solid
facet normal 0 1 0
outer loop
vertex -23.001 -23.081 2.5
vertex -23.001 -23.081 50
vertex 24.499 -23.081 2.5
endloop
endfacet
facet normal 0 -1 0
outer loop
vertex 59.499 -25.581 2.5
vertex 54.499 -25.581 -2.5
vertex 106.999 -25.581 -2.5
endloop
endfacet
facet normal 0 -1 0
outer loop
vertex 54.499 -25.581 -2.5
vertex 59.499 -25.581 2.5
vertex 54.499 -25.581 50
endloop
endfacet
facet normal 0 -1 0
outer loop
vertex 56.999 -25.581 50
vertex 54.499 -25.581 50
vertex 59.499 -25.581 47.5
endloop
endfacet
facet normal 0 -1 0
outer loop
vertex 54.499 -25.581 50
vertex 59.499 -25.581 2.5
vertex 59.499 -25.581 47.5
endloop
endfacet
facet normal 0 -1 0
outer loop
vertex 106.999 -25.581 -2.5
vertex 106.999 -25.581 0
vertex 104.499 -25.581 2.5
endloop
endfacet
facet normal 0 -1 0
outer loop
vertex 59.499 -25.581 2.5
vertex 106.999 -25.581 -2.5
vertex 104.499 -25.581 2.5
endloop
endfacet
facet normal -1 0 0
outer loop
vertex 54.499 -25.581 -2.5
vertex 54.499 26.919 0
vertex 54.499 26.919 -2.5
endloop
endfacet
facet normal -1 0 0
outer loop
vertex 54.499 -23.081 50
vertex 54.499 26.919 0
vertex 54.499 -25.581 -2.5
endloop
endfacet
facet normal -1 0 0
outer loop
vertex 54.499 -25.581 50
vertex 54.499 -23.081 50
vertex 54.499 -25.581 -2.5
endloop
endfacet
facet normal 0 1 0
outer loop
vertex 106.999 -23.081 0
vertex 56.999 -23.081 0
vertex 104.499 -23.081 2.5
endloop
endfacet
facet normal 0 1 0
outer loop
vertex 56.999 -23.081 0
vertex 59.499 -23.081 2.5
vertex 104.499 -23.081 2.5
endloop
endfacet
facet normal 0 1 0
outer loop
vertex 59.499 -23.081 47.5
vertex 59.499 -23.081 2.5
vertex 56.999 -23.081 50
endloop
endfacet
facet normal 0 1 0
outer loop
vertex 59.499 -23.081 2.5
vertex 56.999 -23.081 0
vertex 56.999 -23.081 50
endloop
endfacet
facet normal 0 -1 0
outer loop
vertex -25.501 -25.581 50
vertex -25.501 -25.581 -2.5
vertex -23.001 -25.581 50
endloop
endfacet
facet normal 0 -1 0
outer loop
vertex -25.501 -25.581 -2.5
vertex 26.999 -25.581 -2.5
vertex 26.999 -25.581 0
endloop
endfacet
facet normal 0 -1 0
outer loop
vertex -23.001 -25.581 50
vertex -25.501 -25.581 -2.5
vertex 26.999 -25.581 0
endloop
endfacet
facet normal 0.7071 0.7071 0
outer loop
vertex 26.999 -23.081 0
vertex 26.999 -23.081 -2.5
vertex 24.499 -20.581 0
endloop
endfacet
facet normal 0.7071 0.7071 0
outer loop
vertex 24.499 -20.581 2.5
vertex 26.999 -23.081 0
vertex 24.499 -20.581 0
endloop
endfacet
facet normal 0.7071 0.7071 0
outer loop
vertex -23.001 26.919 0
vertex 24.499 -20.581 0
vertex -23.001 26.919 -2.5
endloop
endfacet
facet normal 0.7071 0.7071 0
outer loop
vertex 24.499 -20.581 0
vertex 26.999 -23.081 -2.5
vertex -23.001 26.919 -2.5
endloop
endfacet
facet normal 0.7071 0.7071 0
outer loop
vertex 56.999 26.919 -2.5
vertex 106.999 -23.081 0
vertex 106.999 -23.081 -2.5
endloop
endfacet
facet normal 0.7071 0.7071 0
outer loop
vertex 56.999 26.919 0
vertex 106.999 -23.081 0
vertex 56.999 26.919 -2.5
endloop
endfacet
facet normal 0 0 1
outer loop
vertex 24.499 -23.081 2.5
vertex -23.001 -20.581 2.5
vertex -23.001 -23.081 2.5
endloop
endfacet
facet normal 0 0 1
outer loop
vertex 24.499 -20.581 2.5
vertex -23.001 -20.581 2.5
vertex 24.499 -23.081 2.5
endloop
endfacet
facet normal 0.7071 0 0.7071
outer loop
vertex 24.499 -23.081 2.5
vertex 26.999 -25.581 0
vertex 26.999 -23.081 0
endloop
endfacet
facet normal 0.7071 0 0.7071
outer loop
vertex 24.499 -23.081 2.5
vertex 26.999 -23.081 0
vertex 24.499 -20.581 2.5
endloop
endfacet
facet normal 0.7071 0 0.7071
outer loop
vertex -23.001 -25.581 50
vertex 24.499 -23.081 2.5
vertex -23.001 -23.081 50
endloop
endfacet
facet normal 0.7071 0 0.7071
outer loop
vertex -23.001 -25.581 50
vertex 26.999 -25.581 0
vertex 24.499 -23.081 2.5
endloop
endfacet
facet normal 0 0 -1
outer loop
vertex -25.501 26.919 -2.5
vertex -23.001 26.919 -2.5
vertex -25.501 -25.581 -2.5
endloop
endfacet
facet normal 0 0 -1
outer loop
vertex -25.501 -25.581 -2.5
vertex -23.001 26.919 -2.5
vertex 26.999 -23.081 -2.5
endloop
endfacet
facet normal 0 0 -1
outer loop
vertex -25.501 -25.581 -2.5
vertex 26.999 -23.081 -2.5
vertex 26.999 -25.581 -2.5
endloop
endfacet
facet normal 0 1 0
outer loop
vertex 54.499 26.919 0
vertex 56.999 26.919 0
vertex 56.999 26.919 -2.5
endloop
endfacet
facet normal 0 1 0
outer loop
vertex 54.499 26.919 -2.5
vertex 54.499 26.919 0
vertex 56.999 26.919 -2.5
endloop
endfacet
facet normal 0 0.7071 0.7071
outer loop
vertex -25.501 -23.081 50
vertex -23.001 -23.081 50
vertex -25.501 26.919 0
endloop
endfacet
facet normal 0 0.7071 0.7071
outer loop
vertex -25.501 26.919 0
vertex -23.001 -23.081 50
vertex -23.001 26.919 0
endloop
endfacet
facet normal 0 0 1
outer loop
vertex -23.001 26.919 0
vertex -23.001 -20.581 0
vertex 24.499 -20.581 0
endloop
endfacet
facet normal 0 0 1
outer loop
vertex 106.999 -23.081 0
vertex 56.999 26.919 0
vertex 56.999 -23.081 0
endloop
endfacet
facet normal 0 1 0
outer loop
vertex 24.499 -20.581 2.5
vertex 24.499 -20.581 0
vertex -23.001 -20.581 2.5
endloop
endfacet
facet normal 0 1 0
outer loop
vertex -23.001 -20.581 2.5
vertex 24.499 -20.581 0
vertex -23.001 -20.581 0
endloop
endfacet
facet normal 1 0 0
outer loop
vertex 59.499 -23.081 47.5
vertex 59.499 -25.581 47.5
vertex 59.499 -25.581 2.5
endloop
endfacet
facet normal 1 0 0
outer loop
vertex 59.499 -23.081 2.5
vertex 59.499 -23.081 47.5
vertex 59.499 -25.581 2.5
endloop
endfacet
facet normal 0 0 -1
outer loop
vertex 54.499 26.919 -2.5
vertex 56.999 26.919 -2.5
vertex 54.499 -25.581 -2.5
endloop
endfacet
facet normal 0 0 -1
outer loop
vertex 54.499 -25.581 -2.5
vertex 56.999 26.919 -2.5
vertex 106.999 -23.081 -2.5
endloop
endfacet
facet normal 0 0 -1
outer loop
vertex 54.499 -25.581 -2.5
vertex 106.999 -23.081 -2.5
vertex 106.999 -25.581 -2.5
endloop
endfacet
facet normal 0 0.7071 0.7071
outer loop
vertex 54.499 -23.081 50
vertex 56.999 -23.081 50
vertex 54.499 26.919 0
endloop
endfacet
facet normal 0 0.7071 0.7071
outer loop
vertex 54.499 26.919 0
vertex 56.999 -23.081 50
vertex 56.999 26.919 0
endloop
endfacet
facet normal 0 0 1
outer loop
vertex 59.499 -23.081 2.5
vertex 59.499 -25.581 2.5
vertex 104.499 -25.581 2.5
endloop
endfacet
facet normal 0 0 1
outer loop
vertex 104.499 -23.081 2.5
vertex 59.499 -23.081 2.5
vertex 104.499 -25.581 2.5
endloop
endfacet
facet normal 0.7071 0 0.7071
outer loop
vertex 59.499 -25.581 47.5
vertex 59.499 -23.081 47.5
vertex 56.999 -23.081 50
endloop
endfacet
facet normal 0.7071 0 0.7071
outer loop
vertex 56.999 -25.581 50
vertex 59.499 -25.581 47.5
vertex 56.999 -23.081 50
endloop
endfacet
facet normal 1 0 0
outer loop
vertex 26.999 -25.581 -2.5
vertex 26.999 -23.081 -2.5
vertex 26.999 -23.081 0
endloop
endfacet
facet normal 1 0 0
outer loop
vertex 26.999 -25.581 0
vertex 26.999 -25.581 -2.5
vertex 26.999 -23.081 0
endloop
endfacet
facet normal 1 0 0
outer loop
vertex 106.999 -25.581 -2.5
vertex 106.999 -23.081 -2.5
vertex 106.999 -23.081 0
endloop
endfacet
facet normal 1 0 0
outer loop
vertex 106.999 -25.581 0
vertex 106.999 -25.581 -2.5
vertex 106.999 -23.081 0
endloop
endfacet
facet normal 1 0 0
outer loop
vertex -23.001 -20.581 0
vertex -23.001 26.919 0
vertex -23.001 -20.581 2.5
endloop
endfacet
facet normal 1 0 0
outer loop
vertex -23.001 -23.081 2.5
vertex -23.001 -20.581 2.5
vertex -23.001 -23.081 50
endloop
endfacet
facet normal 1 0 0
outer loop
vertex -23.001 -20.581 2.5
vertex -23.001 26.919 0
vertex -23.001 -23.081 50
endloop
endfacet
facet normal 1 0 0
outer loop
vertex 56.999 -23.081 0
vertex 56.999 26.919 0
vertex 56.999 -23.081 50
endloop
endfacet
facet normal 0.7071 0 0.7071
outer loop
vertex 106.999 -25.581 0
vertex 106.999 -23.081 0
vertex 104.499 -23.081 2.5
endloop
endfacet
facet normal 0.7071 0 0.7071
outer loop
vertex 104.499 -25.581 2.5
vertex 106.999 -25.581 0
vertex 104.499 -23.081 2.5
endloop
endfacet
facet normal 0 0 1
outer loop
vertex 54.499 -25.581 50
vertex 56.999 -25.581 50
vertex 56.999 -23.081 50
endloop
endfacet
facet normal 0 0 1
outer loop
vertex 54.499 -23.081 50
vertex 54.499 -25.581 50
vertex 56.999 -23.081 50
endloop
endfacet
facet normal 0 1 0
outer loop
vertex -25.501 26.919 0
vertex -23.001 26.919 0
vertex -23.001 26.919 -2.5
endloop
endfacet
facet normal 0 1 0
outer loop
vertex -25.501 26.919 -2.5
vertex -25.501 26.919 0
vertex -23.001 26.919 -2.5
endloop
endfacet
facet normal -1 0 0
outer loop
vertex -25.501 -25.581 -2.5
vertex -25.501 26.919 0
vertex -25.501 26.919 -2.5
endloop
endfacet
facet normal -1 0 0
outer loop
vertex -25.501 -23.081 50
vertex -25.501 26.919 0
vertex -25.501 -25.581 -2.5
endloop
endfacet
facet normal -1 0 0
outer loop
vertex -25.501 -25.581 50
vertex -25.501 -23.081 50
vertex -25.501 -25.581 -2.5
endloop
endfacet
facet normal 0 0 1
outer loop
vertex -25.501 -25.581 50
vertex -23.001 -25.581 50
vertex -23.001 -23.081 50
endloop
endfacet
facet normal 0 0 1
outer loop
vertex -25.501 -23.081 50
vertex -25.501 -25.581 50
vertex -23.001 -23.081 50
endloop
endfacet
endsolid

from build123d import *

# Parameters (mm, degrees)
F1_DEPTH  = 2.5
F2_W      = 50
F2_H      = 2.5
F3_DEPTH  = 2.5
F5_DEPTH  = 2.5
F8_DEPTH  = 2.5
F9_DEPTH  = 2.5
F10_DEPTH = 2.5


with BuildPart() as f1:
    # F0 (on Top) → F1 (new body)
    with BuildSketch(Plane.XY):
        Polygon((24.4987318665, -20.5812184513), (-23.0012681335, 26.9187815487), (-23.0012681335, -20.5812184513), align=None)
        Polygon((24.4987318665, -20.5812184513), (-23.0012681335, -20.5812184513), (-23.0012681335, -23.0812184513), (26.9987318665, -23.0812184513), align=None)
    extrude(amount=-F1_DEPTH)

    # F2 (on face) → F3 (join)
    with BuildSketch(Plane.XZ.offset(23.0812184513)):
        Polygon((-23.0012681335, 50), (-23.0012681335, 0), (26.9987318665, 0), align=None)
        with Locations((1.9987318665, -1.25)):
            Rectangle(F2_W, F2_H)
    extrude(amount=F3_DEPTH)

    # F4 (on face) → F5 (join)
    with BuildSketch(Plane(origin=(-23.0012681335, 0, 0), x_dir=(0, -1, 0), z_dir=(-1, 0, 0))):
        Polygon((23.0812184513, 50), (-26.9187815487, 0), (23.0812184513, 0), align=None)
        Polygon((23.0812184513, 0), (-26.9187815487, 0), (-26.9187815487, -2.5), (25.5812184513, -2.5), (25.5812184513, 50), (23.0812184513, 50), align=None)
    extrude(amount=F5_DEPTH)


with BuildPart() as f6_1:
    # F6: copy of F1
    add(f1.part.moved(Location((80, 0, 0))))

    # F7 (on face) → F8 (cut)
    with BuildSketch(Plane.XZ.offset(25.5812184513)):
        Polygon((104.4987318665, 2.5), (59.4987318665, 47.5), (59.4987318665, 2.5), align=None)
    extrude(amount=-F8_DEPTH, mode=Mode.SUBTRACT)


with BuildPart() as f1_1:
    add(f1.part)

    # F0 (on Top) → F9 (join)
    with BuildSketch(Plane.XY):
        Polygon((24.4987318665, -20.5812184513), (-23.0012681335, -20.5812184513), (-23.0012681335, -23.0812184513), (26.9987318665, -23.0812184513), align=None)
    extrude(amount=F9_DEPTH)

    # F10 (cut): a face of the model
    f10_faces = [f1_1.faces().sort_by_distance(p)[0] for p in [
        (26.1653985331, -23.0812184513, 1.6666666667),
    ]]
    extrude(f10_faces, amount=-F10_DEPTH, mode=Mode.SUBTRACT)


solid = Compound([f6_1.part, f1_1.part])
